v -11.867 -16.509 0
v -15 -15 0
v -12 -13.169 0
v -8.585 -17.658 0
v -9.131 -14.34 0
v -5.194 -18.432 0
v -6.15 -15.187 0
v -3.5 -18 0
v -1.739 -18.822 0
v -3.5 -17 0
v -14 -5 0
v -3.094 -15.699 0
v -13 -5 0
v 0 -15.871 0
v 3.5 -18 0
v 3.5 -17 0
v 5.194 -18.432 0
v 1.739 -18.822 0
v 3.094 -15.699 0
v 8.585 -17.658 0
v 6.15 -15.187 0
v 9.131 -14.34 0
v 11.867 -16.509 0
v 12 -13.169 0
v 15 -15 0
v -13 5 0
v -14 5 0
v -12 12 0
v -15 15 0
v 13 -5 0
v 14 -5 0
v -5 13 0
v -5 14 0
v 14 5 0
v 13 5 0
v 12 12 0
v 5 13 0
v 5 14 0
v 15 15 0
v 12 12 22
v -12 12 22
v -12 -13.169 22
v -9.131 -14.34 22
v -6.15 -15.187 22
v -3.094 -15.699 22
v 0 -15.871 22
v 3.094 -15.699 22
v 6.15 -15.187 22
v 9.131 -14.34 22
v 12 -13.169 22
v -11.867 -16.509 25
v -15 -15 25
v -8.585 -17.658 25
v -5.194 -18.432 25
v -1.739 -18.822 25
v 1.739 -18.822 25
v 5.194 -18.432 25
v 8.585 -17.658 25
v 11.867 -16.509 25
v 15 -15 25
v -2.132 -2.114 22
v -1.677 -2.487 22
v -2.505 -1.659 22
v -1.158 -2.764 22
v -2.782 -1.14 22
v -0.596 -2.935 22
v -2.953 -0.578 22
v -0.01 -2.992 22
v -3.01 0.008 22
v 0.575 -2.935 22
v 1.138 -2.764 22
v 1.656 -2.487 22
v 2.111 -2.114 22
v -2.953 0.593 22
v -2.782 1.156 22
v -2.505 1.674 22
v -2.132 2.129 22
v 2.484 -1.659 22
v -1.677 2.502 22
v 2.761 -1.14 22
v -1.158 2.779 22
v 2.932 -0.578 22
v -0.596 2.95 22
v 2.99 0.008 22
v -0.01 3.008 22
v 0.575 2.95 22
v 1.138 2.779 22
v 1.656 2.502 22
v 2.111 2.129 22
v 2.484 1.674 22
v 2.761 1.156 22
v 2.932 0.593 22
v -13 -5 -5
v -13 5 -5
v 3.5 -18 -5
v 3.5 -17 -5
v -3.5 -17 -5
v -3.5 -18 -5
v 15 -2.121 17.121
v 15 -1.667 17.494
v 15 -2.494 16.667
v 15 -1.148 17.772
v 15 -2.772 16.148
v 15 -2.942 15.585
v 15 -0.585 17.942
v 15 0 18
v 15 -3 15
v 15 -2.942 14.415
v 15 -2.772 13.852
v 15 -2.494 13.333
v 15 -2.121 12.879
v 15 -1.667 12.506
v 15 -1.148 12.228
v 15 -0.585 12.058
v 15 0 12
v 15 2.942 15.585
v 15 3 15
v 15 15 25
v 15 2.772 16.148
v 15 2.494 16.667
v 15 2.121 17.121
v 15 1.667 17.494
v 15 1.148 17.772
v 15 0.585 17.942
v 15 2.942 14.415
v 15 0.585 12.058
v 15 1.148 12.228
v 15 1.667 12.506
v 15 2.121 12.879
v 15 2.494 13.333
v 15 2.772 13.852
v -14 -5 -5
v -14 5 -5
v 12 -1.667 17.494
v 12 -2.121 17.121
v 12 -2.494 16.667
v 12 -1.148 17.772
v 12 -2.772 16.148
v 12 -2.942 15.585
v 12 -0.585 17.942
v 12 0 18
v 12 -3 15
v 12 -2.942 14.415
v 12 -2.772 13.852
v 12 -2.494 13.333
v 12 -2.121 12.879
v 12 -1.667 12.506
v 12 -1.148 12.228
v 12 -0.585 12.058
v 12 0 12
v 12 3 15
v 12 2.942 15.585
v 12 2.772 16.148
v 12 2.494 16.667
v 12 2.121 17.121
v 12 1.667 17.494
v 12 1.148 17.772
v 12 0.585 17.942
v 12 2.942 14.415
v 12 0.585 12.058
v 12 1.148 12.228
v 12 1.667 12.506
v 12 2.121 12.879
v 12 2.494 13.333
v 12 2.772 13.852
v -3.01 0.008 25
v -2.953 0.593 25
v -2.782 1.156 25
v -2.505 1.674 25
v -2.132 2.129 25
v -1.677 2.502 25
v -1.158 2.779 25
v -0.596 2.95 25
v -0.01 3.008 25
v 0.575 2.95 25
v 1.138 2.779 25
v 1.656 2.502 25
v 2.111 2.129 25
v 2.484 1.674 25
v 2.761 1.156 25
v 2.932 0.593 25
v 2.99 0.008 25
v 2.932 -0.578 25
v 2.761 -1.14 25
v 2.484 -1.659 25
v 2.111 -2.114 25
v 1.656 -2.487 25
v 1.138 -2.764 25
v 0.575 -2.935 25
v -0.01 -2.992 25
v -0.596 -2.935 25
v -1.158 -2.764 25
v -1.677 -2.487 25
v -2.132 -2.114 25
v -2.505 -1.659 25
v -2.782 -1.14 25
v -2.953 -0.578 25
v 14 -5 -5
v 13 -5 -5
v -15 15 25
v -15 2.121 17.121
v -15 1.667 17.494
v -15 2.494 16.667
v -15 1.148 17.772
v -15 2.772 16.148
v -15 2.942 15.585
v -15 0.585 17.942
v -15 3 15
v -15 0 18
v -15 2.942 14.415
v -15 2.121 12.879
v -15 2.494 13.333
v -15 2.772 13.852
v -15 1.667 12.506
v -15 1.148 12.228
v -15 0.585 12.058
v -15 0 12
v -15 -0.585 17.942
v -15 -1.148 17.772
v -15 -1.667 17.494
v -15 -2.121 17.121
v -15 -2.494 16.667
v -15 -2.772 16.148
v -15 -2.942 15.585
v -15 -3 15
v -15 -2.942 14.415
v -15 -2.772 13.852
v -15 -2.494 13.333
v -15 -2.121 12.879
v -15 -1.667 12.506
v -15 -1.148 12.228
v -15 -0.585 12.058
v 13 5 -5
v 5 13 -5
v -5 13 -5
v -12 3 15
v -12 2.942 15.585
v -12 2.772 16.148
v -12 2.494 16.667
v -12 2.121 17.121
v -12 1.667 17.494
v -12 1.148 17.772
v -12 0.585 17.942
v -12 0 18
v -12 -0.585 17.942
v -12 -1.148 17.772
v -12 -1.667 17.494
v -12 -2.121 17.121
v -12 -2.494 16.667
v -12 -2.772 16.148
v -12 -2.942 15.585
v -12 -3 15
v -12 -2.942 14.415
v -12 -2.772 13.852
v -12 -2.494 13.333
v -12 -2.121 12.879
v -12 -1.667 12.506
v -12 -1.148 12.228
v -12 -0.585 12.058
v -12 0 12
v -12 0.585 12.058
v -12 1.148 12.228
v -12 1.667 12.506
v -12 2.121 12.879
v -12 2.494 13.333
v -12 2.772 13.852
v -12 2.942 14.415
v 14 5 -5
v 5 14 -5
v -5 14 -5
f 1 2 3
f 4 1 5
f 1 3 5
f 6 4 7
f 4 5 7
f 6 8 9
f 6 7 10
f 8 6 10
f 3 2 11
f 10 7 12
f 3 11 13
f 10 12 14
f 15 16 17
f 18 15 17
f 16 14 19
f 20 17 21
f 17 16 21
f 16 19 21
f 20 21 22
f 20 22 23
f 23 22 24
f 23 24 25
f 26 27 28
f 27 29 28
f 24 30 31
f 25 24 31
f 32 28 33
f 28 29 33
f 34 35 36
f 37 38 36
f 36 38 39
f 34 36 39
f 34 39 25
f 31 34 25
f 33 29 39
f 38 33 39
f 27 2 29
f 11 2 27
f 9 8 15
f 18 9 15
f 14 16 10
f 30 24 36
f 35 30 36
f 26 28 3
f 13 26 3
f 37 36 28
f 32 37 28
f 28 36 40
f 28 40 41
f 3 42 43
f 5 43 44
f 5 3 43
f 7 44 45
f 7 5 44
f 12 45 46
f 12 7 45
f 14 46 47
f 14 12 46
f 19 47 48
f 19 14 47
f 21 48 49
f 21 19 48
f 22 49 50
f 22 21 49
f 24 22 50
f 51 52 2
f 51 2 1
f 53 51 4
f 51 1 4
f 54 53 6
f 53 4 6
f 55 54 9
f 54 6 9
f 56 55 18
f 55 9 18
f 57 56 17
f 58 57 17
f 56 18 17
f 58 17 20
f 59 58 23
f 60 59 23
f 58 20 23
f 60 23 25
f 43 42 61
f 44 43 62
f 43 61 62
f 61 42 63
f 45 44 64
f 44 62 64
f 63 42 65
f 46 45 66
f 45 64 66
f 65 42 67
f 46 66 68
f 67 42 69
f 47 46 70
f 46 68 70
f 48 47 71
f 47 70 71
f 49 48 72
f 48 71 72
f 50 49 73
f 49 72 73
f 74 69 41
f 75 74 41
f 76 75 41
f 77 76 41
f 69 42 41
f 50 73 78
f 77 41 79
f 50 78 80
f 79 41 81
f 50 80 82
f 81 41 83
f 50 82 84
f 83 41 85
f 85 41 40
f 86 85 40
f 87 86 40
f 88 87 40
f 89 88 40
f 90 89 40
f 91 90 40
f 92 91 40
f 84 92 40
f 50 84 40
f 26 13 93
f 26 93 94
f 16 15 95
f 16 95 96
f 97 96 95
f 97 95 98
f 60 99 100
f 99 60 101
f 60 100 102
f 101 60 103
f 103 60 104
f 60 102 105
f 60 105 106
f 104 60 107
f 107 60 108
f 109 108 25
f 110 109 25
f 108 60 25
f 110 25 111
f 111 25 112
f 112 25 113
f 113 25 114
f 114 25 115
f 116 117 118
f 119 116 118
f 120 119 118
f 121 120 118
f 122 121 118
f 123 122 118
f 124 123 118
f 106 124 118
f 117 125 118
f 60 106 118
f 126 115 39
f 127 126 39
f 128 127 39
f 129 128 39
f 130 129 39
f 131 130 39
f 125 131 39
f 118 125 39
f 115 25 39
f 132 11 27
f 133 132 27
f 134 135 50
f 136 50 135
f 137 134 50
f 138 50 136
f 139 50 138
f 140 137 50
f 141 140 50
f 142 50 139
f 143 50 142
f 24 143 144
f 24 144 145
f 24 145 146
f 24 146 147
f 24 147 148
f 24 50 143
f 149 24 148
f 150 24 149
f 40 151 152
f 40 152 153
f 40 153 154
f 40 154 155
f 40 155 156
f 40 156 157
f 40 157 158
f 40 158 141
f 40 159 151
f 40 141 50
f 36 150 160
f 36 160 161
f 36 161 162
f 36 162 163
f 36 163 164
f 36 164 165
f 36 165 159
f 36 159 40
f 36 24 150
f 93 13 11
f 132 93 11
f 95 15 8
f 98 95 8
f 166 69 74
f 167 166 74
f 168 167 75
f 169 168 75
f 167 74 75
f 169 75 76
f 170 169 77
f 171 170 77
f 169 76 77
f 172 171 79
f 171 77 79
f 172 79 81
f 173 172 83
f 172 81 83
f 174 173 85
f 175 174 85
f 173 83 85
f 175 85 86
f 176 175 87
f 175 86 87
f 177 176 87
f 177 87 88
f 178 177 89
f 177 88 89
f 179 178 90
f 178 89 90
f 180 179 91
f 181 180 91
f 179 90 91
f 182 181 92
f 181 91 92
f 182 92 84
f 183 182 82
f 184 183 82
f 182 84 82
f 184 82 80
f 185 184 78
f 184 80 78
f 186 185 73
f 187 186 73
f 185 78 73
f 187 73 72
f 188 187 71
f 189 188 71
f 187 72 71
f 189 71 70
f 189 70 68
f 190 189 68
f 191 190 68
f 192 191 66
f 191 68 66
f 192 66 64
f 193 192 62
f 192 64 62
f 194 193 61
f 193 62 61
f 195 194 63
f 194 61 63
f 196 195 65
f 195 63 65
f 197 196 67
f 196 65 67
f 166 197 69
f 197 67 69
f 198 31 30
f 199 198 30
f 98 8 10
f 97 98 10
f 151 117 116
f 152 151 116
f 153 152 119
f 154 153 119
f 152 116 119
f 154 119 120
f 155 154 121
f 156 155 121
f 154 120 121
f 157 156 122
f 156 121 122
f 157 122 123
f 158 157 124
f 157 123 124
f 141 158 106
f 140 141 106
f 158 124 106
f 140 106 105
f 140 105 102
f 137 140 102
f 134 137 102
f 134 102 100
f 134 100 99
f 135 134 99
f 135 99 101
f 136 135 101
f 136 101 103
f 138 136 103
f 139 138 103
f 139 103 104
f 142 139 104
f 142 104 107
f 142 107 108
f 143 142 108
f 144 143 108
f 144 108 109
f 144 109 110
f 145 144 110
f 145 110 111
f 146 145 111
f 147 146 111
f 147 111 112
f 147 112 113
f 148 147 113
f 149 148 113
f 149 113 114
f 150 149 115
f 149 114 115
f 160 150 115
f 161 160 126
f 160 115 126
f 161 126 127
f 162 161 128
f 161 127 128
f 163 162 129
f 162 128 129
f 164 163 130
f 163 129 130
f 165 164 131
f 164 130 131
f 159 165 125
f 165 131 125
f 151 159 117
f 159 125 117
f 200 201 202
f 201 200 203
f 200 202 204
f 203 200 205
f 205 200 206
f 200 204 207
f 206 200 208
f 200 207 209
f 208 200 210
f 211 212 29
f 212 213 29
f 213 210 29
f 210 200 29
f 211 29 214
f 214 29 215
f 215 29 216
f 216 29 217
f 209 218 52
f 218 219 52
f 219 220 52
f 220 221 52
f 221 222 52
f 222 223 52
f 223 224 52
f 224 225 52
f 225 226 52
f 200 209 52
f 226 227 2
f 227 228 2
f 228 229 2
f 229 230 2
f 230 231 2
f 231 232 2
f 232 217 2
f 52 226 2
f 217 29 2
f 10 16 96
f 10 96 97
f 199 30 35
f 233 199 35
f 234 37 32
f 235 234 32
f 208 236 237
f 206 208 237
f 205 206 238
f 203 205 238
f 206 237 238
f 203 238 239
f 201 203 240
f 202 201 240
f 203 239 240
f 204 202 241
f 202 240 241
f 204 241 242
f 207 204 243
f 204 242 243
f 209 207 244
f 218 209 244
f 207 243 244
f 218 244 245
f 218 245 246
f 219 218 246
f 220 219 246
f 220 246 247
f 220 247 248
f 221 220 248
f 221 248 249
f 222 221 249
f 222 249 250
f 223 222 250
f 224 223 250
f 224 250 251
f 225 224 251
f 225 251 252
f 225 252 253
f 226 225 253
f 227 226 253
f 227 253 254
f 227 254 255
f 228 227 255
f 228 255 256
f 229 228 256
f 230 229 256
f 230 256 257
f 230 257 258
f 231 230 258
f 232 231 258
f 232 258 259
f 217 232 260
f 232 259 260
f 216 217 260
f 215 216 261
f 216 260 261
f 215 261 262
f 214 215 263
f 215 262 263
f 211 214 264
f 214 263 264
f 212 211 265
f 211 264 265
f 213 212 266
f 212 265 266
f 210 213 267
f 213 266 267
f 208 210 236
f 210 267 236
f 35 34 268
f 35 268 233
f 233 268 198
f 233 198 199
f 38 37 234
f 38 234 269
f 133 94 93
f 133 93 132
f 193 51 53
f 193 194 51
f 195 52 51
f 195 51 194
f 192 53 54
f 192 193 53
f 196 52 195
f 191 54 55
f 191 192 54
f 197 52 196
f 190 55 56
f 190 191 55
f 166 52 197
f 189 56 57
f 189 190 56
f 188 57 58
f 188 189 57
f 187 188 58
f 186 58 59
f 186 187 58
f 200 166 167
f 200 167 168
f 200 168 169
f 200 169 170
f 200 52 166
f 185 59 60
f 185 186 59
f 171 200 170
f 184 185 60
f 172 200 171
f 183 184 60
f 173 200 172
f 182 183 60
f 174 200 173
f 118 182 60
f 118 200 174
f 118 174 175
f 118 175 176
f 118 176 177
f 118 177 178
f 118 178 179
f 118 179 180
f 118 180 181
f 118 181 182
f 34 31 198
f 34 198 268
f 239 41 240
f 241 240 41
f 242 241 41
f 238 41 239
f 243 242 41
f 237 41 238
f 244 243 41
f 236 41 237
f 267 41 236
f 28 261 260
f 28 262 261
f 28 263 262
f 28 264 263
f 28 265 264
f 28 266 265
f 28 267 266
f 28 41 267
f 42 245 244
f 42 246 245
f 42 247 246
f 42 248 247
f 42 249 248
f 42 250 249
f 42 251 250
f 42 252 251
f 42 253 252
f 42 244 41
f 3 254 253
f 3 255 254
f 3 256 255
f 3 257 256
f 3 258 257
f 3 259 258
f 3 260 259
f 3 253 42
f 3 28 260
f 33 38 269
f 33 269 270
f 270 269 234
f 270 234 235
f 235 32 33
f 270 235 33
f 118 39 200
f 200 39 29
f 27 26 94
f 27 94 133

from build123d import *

# Parameters (mm, degrees)
BOSS_EXTRUDE1_DEPTH = 25
SHELL13_T           = -3
SKETCH3_R           = 3
CUT_EXTRUDE2_DEPTH  = 3
SKETCH4_W           = 10
SKETCH4_H           = 1
SKETCH4_W_2         = 1
SKETCH4_H_2         = 10
SKETCH4_W_3         = 7
BOSS_EXTRUDE2_DEPTH = 5
SKETCH5_R           = 3
CUT_EXTRUDE3_DEPTH  = 30


with BuildPart() as part:
    # Sketch1 → Boss-Extrude1 (new body)
    with BuildSketch(Plane.XY):
        with BuildLine():
            Line((15, -15), (15, 15))
            Line((15, 15), (-15, 15))
            Line((-15, 15), (-15, -15))
            ThreePointArc((-15, -15), (0, -18.870680067), (15, -15))
        make_face()
    extrude(amount=BOSS_EXTRUDE1_DEPTH)

    # Shell13
    shell13_openings = [part.faces().sort_by_distance(p)[0] for p in [
        (0, -1.327259688, 0),
    ]]
    offset(amount=SHELL13_T, openings=shell13_openings, kind=Kind.INTERSECTION)

    # Sketch3 → Cut-Extrude2 (cut)
    with BuildSketch(Plane(origin=(0, 0, 22), x_dir=(-1, 0, 0), z_dir=(0, 0, -1))):
        with Locations((0.010259738, 0.007572697)):
            Circle(SKETCH3_R)
    extrude(amount=-CUT_EXTRUDE2_DEPTH, mode=Mode.SUBTRACT)

    # Sketch4 → Boss-Extrude2 (add)
    with BuildSketch(Plane(origin=(0, 0, 0), x_dir=(-1, 0, 0), z_dir=(0, 0, -1))):
        with Locations((0, 13.5)):
            Rectangle(SKETCH4_W, SKETCH4_H)
        with Locations((-13.5, 0)):
            Rectangle(SKETCH4_W_2, SKETCH4_H_2)
        with Locations((0, -17.5)):
            Rectangle(SKETCH4_W_3, SKETCH4_H)
        with Locations((13.5, 0)):
            Rectangle(SKETCH4_W_2, SKETCH4_H_2)
    extrude(amount=BOSS_EXTRUDE2_DEPTH)

    # Sketch5 → Cut-Extrude3 (cut)
    with BuildSketch(Plane(origin=(15, 0, 0), x_dir=(0, 0, -1), z_dir=(1, 0, 0))):
        with Locations(Location((-15, 0, 0), (0, 0, 90))):
            Circle(SKETCH5_R)
    extrude(amount=-CUT_EXTRUDE3_DEPTH, mode=Mode.SUBTRACT)


solid = part.part
